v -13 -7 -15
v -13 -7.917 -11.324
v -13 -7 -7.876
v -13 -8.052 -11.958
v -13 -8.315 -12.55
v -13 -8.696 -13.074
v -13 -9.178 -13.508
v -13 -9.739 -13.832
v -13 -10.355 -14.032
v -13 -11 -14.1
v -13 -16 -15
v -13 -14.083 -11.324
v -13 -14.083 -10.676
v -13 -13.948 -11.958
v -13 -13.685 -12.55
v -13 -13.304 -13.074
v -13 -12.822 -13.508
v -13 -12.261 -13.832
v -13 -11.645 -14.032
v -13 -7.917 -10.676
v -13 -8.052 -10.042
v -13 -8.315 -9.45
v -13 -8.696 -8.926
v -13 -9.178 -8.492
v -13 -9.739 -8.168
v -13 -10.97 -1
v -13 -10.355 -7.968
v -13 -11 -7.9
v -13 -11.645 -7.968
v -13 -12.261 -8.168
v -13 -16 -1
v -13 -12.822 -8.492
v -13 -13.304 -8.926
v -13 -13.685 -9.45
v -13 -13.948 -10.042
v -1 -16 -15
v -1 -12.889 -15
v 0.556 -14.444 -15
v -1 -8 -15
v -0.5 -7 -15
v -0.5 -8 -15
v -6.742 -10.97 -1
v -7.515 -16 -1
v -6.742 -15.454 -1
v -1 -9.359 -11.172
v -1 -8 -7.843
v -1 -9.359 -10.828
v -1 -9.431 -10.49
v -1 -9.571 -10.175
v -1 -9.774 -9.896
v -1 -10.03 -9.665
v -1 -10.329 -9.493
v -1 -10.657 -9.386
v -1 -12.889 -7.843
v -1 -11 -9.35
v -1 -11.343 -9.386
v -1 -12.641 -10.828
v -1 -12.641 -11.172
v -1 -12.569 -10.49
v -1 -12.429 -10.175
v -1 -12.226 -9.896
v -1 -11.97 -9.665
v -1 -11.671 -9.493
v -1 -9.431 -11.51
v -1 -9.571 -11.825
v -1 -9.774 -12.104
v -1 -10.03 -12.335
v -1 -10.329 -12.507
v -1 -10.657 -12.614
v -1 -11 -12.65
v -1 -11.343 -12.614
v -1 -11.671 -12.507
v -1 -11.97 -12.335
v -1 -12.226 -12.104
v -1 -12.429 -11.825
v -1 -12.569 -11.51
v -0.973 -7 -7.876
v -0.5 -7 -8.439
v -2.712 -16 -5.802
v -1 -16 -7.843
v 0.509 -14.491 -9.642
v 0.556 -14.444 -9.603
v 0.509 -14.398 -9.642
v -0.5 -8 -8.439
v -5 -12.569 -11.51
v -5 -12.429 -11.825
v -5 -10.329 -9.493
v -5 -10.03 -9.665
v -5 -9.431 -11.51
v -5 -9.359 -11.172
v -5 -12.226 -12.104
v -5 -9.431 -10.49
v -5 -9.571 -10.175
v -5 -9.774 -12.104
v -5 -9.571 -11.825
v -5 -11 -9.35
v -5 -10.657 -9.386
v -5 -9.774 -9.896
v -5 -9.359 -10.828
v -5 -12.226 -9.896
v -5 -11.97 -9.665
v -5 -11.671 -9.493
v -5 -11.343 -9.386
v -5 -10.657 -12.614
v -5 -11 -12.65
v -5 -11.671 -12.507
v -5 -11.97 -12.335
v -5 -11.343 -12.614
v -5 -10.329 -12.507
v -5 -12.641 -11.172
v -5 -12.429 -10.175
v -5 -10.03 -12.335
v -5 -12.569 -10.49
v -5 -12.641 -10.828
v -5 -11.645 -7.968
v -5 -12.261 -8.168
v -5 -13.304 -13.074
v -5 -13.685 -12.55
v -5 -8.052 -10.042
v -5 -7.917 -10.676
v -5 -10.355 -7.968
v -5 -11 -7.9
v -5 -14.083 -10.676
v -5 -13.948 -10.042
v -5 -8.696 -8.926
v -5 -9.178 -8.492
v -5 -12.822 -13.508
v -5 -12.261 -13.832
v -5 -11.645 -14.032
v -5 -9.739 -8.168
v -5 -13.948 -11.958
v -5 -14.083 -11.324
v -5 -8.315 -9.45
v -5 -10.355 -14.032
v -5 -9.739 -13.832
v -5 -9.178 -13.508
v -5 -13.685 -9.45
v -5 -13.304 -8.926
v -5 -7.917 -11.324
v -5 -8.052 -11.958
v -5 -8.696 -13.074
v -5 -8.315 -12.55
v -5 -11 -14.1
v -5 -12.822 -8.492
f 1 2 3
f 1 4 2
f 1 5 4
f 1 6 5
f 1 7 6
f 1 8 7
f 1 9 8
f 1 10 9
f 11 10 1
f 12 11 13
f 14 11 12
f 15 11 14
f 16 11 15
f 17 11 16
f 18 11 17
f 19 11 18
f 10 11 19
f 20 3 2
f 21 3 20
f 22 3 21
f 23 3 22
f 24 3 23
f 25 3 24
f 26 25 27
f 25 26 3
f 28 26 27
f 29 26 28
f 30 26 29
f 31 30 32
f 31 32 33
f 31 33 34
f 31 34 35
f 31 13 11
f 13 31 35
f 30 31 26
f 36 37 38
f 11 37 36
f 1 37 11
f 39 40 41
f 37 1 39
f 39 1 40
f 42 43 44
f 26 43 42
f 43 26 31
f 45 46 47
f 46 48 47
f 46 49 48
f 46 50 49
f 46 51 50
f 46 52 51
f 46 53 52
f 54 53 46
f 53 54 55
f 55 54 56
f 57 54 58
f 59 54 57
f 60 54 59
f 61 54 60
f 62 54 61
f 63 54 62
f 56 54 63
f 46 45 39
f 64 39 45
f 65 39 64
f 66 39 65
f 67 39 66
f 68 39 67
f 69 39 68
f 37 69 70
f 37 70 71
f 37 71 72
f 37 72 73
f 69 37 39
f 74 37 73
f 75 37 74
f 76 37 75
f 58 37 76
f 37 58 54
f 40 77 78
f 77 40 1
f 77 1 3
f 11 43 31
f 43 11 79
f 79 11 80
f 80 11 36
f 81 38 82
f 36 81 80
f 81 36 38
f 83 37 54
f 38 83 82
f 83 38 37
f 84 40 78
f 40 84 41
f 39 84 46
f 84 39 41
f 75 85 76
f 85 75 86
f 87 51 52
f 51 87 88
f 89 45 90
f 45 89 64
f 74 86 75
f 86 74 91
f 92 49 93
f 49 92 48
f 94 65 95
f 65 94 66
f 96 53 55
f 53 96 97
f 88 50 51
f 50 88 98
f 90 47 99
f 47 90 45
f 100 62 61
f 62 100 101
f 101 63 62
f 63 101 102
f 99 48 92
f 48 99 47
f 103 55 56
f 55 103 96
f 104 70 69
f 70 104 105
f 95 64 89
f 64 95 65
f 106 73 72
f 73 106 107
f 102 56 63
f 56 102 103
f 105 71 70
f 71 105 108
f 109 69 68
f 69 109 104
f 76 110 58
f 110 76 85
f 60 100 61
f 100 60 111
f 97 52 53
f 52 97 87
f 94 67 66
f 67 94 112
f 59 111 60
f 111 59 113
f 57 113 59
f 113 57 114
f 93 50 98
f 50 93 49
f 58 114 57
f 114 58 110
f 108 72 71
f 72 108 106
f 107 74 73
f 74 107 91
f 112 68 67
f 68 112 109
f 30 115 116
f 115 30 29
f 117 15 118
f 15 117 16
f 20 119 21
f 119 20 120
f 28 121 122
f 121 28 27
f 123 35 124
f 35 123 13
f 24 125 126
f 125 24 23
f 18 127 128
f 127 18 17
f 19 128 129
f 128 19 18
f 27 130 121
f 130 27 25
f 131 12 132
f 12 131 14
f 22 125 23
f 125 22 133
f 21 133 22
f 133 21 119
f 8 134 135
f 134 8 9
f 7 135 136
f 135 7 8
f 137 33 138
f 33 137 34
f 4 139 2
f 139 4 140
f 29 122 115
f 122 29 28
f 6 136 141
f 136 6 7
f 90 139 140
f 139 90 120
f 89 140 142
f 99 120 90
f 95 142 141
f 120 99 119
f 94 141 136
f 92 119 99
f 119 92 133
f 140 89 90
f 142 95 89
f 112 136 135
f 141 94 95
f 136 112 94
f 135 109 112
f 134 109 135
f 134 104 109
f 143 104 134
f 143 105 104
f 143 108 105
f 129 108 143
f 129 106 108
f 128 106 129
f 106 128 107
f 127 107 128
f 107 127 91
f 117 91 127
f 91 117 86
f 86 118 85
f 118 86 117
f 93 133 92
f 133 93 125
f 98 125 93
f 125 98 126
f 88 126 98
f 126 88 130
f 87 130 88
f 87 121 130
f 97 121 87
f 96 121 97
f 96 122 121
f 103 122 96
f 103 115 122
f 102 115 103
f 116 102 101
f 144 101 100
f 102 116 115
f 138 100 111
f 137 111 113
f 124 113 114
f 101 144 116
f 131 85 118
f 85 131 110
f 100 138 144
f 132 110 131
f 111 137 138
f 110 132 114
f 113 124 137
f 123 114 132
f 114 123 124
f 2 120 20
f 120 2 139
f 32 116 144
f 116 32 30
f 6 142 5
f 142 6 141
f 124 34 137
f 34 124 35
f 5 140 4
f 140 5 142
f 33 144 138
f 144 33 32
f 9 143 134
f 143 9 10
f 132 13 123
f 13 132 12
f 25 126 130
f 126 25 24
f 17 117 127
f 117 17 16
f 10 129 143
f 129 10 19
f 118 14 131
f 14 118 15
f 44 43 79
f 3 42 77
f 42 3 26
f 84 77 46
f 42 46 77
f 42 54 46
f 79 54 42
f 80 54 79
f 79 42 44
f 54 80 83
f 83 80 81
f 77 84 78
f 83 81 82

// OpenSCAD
// PRUSA iteration4
// Endstop block
// GNU GPL v3
// Josef Průša <iam@josefprusa.cz> and contributors
// http://www.reprap.org/wiki/Prusa_Mendel
// http://prusamendel.org

module endstop_block(){
    difference(){
        union(){
            // Body
            translate([1,-16,1]) cube([12,9,14]);
            translate([1,-16,1]) rotate([0,0,45]) cube([3,2.2,14]);
            translate([0.5,-8,1]) cube([3,1,14]);
        }

        // Screw
        translate([-4,-11,11]) rotate([0,90,0]) cylinder(r=1.65,h=10,$fn=30);
        translate([5,-11,11]) rotate([0,90,0]) cylinder(r=3.1,h=10,$fn=30);

        // Edges
        translate([-13,-22,-0]) rotate([45,45,0]) cube([15,15,15]);
        translate([-1,-0,-10]) rotate([60,0,0]) cube([15,15,15]);
        translate([-12,-20,0]) rotate([0,50,0]) cube([15,15,15]);
    }
}

rotate([0,180,0]) endstop_block();
